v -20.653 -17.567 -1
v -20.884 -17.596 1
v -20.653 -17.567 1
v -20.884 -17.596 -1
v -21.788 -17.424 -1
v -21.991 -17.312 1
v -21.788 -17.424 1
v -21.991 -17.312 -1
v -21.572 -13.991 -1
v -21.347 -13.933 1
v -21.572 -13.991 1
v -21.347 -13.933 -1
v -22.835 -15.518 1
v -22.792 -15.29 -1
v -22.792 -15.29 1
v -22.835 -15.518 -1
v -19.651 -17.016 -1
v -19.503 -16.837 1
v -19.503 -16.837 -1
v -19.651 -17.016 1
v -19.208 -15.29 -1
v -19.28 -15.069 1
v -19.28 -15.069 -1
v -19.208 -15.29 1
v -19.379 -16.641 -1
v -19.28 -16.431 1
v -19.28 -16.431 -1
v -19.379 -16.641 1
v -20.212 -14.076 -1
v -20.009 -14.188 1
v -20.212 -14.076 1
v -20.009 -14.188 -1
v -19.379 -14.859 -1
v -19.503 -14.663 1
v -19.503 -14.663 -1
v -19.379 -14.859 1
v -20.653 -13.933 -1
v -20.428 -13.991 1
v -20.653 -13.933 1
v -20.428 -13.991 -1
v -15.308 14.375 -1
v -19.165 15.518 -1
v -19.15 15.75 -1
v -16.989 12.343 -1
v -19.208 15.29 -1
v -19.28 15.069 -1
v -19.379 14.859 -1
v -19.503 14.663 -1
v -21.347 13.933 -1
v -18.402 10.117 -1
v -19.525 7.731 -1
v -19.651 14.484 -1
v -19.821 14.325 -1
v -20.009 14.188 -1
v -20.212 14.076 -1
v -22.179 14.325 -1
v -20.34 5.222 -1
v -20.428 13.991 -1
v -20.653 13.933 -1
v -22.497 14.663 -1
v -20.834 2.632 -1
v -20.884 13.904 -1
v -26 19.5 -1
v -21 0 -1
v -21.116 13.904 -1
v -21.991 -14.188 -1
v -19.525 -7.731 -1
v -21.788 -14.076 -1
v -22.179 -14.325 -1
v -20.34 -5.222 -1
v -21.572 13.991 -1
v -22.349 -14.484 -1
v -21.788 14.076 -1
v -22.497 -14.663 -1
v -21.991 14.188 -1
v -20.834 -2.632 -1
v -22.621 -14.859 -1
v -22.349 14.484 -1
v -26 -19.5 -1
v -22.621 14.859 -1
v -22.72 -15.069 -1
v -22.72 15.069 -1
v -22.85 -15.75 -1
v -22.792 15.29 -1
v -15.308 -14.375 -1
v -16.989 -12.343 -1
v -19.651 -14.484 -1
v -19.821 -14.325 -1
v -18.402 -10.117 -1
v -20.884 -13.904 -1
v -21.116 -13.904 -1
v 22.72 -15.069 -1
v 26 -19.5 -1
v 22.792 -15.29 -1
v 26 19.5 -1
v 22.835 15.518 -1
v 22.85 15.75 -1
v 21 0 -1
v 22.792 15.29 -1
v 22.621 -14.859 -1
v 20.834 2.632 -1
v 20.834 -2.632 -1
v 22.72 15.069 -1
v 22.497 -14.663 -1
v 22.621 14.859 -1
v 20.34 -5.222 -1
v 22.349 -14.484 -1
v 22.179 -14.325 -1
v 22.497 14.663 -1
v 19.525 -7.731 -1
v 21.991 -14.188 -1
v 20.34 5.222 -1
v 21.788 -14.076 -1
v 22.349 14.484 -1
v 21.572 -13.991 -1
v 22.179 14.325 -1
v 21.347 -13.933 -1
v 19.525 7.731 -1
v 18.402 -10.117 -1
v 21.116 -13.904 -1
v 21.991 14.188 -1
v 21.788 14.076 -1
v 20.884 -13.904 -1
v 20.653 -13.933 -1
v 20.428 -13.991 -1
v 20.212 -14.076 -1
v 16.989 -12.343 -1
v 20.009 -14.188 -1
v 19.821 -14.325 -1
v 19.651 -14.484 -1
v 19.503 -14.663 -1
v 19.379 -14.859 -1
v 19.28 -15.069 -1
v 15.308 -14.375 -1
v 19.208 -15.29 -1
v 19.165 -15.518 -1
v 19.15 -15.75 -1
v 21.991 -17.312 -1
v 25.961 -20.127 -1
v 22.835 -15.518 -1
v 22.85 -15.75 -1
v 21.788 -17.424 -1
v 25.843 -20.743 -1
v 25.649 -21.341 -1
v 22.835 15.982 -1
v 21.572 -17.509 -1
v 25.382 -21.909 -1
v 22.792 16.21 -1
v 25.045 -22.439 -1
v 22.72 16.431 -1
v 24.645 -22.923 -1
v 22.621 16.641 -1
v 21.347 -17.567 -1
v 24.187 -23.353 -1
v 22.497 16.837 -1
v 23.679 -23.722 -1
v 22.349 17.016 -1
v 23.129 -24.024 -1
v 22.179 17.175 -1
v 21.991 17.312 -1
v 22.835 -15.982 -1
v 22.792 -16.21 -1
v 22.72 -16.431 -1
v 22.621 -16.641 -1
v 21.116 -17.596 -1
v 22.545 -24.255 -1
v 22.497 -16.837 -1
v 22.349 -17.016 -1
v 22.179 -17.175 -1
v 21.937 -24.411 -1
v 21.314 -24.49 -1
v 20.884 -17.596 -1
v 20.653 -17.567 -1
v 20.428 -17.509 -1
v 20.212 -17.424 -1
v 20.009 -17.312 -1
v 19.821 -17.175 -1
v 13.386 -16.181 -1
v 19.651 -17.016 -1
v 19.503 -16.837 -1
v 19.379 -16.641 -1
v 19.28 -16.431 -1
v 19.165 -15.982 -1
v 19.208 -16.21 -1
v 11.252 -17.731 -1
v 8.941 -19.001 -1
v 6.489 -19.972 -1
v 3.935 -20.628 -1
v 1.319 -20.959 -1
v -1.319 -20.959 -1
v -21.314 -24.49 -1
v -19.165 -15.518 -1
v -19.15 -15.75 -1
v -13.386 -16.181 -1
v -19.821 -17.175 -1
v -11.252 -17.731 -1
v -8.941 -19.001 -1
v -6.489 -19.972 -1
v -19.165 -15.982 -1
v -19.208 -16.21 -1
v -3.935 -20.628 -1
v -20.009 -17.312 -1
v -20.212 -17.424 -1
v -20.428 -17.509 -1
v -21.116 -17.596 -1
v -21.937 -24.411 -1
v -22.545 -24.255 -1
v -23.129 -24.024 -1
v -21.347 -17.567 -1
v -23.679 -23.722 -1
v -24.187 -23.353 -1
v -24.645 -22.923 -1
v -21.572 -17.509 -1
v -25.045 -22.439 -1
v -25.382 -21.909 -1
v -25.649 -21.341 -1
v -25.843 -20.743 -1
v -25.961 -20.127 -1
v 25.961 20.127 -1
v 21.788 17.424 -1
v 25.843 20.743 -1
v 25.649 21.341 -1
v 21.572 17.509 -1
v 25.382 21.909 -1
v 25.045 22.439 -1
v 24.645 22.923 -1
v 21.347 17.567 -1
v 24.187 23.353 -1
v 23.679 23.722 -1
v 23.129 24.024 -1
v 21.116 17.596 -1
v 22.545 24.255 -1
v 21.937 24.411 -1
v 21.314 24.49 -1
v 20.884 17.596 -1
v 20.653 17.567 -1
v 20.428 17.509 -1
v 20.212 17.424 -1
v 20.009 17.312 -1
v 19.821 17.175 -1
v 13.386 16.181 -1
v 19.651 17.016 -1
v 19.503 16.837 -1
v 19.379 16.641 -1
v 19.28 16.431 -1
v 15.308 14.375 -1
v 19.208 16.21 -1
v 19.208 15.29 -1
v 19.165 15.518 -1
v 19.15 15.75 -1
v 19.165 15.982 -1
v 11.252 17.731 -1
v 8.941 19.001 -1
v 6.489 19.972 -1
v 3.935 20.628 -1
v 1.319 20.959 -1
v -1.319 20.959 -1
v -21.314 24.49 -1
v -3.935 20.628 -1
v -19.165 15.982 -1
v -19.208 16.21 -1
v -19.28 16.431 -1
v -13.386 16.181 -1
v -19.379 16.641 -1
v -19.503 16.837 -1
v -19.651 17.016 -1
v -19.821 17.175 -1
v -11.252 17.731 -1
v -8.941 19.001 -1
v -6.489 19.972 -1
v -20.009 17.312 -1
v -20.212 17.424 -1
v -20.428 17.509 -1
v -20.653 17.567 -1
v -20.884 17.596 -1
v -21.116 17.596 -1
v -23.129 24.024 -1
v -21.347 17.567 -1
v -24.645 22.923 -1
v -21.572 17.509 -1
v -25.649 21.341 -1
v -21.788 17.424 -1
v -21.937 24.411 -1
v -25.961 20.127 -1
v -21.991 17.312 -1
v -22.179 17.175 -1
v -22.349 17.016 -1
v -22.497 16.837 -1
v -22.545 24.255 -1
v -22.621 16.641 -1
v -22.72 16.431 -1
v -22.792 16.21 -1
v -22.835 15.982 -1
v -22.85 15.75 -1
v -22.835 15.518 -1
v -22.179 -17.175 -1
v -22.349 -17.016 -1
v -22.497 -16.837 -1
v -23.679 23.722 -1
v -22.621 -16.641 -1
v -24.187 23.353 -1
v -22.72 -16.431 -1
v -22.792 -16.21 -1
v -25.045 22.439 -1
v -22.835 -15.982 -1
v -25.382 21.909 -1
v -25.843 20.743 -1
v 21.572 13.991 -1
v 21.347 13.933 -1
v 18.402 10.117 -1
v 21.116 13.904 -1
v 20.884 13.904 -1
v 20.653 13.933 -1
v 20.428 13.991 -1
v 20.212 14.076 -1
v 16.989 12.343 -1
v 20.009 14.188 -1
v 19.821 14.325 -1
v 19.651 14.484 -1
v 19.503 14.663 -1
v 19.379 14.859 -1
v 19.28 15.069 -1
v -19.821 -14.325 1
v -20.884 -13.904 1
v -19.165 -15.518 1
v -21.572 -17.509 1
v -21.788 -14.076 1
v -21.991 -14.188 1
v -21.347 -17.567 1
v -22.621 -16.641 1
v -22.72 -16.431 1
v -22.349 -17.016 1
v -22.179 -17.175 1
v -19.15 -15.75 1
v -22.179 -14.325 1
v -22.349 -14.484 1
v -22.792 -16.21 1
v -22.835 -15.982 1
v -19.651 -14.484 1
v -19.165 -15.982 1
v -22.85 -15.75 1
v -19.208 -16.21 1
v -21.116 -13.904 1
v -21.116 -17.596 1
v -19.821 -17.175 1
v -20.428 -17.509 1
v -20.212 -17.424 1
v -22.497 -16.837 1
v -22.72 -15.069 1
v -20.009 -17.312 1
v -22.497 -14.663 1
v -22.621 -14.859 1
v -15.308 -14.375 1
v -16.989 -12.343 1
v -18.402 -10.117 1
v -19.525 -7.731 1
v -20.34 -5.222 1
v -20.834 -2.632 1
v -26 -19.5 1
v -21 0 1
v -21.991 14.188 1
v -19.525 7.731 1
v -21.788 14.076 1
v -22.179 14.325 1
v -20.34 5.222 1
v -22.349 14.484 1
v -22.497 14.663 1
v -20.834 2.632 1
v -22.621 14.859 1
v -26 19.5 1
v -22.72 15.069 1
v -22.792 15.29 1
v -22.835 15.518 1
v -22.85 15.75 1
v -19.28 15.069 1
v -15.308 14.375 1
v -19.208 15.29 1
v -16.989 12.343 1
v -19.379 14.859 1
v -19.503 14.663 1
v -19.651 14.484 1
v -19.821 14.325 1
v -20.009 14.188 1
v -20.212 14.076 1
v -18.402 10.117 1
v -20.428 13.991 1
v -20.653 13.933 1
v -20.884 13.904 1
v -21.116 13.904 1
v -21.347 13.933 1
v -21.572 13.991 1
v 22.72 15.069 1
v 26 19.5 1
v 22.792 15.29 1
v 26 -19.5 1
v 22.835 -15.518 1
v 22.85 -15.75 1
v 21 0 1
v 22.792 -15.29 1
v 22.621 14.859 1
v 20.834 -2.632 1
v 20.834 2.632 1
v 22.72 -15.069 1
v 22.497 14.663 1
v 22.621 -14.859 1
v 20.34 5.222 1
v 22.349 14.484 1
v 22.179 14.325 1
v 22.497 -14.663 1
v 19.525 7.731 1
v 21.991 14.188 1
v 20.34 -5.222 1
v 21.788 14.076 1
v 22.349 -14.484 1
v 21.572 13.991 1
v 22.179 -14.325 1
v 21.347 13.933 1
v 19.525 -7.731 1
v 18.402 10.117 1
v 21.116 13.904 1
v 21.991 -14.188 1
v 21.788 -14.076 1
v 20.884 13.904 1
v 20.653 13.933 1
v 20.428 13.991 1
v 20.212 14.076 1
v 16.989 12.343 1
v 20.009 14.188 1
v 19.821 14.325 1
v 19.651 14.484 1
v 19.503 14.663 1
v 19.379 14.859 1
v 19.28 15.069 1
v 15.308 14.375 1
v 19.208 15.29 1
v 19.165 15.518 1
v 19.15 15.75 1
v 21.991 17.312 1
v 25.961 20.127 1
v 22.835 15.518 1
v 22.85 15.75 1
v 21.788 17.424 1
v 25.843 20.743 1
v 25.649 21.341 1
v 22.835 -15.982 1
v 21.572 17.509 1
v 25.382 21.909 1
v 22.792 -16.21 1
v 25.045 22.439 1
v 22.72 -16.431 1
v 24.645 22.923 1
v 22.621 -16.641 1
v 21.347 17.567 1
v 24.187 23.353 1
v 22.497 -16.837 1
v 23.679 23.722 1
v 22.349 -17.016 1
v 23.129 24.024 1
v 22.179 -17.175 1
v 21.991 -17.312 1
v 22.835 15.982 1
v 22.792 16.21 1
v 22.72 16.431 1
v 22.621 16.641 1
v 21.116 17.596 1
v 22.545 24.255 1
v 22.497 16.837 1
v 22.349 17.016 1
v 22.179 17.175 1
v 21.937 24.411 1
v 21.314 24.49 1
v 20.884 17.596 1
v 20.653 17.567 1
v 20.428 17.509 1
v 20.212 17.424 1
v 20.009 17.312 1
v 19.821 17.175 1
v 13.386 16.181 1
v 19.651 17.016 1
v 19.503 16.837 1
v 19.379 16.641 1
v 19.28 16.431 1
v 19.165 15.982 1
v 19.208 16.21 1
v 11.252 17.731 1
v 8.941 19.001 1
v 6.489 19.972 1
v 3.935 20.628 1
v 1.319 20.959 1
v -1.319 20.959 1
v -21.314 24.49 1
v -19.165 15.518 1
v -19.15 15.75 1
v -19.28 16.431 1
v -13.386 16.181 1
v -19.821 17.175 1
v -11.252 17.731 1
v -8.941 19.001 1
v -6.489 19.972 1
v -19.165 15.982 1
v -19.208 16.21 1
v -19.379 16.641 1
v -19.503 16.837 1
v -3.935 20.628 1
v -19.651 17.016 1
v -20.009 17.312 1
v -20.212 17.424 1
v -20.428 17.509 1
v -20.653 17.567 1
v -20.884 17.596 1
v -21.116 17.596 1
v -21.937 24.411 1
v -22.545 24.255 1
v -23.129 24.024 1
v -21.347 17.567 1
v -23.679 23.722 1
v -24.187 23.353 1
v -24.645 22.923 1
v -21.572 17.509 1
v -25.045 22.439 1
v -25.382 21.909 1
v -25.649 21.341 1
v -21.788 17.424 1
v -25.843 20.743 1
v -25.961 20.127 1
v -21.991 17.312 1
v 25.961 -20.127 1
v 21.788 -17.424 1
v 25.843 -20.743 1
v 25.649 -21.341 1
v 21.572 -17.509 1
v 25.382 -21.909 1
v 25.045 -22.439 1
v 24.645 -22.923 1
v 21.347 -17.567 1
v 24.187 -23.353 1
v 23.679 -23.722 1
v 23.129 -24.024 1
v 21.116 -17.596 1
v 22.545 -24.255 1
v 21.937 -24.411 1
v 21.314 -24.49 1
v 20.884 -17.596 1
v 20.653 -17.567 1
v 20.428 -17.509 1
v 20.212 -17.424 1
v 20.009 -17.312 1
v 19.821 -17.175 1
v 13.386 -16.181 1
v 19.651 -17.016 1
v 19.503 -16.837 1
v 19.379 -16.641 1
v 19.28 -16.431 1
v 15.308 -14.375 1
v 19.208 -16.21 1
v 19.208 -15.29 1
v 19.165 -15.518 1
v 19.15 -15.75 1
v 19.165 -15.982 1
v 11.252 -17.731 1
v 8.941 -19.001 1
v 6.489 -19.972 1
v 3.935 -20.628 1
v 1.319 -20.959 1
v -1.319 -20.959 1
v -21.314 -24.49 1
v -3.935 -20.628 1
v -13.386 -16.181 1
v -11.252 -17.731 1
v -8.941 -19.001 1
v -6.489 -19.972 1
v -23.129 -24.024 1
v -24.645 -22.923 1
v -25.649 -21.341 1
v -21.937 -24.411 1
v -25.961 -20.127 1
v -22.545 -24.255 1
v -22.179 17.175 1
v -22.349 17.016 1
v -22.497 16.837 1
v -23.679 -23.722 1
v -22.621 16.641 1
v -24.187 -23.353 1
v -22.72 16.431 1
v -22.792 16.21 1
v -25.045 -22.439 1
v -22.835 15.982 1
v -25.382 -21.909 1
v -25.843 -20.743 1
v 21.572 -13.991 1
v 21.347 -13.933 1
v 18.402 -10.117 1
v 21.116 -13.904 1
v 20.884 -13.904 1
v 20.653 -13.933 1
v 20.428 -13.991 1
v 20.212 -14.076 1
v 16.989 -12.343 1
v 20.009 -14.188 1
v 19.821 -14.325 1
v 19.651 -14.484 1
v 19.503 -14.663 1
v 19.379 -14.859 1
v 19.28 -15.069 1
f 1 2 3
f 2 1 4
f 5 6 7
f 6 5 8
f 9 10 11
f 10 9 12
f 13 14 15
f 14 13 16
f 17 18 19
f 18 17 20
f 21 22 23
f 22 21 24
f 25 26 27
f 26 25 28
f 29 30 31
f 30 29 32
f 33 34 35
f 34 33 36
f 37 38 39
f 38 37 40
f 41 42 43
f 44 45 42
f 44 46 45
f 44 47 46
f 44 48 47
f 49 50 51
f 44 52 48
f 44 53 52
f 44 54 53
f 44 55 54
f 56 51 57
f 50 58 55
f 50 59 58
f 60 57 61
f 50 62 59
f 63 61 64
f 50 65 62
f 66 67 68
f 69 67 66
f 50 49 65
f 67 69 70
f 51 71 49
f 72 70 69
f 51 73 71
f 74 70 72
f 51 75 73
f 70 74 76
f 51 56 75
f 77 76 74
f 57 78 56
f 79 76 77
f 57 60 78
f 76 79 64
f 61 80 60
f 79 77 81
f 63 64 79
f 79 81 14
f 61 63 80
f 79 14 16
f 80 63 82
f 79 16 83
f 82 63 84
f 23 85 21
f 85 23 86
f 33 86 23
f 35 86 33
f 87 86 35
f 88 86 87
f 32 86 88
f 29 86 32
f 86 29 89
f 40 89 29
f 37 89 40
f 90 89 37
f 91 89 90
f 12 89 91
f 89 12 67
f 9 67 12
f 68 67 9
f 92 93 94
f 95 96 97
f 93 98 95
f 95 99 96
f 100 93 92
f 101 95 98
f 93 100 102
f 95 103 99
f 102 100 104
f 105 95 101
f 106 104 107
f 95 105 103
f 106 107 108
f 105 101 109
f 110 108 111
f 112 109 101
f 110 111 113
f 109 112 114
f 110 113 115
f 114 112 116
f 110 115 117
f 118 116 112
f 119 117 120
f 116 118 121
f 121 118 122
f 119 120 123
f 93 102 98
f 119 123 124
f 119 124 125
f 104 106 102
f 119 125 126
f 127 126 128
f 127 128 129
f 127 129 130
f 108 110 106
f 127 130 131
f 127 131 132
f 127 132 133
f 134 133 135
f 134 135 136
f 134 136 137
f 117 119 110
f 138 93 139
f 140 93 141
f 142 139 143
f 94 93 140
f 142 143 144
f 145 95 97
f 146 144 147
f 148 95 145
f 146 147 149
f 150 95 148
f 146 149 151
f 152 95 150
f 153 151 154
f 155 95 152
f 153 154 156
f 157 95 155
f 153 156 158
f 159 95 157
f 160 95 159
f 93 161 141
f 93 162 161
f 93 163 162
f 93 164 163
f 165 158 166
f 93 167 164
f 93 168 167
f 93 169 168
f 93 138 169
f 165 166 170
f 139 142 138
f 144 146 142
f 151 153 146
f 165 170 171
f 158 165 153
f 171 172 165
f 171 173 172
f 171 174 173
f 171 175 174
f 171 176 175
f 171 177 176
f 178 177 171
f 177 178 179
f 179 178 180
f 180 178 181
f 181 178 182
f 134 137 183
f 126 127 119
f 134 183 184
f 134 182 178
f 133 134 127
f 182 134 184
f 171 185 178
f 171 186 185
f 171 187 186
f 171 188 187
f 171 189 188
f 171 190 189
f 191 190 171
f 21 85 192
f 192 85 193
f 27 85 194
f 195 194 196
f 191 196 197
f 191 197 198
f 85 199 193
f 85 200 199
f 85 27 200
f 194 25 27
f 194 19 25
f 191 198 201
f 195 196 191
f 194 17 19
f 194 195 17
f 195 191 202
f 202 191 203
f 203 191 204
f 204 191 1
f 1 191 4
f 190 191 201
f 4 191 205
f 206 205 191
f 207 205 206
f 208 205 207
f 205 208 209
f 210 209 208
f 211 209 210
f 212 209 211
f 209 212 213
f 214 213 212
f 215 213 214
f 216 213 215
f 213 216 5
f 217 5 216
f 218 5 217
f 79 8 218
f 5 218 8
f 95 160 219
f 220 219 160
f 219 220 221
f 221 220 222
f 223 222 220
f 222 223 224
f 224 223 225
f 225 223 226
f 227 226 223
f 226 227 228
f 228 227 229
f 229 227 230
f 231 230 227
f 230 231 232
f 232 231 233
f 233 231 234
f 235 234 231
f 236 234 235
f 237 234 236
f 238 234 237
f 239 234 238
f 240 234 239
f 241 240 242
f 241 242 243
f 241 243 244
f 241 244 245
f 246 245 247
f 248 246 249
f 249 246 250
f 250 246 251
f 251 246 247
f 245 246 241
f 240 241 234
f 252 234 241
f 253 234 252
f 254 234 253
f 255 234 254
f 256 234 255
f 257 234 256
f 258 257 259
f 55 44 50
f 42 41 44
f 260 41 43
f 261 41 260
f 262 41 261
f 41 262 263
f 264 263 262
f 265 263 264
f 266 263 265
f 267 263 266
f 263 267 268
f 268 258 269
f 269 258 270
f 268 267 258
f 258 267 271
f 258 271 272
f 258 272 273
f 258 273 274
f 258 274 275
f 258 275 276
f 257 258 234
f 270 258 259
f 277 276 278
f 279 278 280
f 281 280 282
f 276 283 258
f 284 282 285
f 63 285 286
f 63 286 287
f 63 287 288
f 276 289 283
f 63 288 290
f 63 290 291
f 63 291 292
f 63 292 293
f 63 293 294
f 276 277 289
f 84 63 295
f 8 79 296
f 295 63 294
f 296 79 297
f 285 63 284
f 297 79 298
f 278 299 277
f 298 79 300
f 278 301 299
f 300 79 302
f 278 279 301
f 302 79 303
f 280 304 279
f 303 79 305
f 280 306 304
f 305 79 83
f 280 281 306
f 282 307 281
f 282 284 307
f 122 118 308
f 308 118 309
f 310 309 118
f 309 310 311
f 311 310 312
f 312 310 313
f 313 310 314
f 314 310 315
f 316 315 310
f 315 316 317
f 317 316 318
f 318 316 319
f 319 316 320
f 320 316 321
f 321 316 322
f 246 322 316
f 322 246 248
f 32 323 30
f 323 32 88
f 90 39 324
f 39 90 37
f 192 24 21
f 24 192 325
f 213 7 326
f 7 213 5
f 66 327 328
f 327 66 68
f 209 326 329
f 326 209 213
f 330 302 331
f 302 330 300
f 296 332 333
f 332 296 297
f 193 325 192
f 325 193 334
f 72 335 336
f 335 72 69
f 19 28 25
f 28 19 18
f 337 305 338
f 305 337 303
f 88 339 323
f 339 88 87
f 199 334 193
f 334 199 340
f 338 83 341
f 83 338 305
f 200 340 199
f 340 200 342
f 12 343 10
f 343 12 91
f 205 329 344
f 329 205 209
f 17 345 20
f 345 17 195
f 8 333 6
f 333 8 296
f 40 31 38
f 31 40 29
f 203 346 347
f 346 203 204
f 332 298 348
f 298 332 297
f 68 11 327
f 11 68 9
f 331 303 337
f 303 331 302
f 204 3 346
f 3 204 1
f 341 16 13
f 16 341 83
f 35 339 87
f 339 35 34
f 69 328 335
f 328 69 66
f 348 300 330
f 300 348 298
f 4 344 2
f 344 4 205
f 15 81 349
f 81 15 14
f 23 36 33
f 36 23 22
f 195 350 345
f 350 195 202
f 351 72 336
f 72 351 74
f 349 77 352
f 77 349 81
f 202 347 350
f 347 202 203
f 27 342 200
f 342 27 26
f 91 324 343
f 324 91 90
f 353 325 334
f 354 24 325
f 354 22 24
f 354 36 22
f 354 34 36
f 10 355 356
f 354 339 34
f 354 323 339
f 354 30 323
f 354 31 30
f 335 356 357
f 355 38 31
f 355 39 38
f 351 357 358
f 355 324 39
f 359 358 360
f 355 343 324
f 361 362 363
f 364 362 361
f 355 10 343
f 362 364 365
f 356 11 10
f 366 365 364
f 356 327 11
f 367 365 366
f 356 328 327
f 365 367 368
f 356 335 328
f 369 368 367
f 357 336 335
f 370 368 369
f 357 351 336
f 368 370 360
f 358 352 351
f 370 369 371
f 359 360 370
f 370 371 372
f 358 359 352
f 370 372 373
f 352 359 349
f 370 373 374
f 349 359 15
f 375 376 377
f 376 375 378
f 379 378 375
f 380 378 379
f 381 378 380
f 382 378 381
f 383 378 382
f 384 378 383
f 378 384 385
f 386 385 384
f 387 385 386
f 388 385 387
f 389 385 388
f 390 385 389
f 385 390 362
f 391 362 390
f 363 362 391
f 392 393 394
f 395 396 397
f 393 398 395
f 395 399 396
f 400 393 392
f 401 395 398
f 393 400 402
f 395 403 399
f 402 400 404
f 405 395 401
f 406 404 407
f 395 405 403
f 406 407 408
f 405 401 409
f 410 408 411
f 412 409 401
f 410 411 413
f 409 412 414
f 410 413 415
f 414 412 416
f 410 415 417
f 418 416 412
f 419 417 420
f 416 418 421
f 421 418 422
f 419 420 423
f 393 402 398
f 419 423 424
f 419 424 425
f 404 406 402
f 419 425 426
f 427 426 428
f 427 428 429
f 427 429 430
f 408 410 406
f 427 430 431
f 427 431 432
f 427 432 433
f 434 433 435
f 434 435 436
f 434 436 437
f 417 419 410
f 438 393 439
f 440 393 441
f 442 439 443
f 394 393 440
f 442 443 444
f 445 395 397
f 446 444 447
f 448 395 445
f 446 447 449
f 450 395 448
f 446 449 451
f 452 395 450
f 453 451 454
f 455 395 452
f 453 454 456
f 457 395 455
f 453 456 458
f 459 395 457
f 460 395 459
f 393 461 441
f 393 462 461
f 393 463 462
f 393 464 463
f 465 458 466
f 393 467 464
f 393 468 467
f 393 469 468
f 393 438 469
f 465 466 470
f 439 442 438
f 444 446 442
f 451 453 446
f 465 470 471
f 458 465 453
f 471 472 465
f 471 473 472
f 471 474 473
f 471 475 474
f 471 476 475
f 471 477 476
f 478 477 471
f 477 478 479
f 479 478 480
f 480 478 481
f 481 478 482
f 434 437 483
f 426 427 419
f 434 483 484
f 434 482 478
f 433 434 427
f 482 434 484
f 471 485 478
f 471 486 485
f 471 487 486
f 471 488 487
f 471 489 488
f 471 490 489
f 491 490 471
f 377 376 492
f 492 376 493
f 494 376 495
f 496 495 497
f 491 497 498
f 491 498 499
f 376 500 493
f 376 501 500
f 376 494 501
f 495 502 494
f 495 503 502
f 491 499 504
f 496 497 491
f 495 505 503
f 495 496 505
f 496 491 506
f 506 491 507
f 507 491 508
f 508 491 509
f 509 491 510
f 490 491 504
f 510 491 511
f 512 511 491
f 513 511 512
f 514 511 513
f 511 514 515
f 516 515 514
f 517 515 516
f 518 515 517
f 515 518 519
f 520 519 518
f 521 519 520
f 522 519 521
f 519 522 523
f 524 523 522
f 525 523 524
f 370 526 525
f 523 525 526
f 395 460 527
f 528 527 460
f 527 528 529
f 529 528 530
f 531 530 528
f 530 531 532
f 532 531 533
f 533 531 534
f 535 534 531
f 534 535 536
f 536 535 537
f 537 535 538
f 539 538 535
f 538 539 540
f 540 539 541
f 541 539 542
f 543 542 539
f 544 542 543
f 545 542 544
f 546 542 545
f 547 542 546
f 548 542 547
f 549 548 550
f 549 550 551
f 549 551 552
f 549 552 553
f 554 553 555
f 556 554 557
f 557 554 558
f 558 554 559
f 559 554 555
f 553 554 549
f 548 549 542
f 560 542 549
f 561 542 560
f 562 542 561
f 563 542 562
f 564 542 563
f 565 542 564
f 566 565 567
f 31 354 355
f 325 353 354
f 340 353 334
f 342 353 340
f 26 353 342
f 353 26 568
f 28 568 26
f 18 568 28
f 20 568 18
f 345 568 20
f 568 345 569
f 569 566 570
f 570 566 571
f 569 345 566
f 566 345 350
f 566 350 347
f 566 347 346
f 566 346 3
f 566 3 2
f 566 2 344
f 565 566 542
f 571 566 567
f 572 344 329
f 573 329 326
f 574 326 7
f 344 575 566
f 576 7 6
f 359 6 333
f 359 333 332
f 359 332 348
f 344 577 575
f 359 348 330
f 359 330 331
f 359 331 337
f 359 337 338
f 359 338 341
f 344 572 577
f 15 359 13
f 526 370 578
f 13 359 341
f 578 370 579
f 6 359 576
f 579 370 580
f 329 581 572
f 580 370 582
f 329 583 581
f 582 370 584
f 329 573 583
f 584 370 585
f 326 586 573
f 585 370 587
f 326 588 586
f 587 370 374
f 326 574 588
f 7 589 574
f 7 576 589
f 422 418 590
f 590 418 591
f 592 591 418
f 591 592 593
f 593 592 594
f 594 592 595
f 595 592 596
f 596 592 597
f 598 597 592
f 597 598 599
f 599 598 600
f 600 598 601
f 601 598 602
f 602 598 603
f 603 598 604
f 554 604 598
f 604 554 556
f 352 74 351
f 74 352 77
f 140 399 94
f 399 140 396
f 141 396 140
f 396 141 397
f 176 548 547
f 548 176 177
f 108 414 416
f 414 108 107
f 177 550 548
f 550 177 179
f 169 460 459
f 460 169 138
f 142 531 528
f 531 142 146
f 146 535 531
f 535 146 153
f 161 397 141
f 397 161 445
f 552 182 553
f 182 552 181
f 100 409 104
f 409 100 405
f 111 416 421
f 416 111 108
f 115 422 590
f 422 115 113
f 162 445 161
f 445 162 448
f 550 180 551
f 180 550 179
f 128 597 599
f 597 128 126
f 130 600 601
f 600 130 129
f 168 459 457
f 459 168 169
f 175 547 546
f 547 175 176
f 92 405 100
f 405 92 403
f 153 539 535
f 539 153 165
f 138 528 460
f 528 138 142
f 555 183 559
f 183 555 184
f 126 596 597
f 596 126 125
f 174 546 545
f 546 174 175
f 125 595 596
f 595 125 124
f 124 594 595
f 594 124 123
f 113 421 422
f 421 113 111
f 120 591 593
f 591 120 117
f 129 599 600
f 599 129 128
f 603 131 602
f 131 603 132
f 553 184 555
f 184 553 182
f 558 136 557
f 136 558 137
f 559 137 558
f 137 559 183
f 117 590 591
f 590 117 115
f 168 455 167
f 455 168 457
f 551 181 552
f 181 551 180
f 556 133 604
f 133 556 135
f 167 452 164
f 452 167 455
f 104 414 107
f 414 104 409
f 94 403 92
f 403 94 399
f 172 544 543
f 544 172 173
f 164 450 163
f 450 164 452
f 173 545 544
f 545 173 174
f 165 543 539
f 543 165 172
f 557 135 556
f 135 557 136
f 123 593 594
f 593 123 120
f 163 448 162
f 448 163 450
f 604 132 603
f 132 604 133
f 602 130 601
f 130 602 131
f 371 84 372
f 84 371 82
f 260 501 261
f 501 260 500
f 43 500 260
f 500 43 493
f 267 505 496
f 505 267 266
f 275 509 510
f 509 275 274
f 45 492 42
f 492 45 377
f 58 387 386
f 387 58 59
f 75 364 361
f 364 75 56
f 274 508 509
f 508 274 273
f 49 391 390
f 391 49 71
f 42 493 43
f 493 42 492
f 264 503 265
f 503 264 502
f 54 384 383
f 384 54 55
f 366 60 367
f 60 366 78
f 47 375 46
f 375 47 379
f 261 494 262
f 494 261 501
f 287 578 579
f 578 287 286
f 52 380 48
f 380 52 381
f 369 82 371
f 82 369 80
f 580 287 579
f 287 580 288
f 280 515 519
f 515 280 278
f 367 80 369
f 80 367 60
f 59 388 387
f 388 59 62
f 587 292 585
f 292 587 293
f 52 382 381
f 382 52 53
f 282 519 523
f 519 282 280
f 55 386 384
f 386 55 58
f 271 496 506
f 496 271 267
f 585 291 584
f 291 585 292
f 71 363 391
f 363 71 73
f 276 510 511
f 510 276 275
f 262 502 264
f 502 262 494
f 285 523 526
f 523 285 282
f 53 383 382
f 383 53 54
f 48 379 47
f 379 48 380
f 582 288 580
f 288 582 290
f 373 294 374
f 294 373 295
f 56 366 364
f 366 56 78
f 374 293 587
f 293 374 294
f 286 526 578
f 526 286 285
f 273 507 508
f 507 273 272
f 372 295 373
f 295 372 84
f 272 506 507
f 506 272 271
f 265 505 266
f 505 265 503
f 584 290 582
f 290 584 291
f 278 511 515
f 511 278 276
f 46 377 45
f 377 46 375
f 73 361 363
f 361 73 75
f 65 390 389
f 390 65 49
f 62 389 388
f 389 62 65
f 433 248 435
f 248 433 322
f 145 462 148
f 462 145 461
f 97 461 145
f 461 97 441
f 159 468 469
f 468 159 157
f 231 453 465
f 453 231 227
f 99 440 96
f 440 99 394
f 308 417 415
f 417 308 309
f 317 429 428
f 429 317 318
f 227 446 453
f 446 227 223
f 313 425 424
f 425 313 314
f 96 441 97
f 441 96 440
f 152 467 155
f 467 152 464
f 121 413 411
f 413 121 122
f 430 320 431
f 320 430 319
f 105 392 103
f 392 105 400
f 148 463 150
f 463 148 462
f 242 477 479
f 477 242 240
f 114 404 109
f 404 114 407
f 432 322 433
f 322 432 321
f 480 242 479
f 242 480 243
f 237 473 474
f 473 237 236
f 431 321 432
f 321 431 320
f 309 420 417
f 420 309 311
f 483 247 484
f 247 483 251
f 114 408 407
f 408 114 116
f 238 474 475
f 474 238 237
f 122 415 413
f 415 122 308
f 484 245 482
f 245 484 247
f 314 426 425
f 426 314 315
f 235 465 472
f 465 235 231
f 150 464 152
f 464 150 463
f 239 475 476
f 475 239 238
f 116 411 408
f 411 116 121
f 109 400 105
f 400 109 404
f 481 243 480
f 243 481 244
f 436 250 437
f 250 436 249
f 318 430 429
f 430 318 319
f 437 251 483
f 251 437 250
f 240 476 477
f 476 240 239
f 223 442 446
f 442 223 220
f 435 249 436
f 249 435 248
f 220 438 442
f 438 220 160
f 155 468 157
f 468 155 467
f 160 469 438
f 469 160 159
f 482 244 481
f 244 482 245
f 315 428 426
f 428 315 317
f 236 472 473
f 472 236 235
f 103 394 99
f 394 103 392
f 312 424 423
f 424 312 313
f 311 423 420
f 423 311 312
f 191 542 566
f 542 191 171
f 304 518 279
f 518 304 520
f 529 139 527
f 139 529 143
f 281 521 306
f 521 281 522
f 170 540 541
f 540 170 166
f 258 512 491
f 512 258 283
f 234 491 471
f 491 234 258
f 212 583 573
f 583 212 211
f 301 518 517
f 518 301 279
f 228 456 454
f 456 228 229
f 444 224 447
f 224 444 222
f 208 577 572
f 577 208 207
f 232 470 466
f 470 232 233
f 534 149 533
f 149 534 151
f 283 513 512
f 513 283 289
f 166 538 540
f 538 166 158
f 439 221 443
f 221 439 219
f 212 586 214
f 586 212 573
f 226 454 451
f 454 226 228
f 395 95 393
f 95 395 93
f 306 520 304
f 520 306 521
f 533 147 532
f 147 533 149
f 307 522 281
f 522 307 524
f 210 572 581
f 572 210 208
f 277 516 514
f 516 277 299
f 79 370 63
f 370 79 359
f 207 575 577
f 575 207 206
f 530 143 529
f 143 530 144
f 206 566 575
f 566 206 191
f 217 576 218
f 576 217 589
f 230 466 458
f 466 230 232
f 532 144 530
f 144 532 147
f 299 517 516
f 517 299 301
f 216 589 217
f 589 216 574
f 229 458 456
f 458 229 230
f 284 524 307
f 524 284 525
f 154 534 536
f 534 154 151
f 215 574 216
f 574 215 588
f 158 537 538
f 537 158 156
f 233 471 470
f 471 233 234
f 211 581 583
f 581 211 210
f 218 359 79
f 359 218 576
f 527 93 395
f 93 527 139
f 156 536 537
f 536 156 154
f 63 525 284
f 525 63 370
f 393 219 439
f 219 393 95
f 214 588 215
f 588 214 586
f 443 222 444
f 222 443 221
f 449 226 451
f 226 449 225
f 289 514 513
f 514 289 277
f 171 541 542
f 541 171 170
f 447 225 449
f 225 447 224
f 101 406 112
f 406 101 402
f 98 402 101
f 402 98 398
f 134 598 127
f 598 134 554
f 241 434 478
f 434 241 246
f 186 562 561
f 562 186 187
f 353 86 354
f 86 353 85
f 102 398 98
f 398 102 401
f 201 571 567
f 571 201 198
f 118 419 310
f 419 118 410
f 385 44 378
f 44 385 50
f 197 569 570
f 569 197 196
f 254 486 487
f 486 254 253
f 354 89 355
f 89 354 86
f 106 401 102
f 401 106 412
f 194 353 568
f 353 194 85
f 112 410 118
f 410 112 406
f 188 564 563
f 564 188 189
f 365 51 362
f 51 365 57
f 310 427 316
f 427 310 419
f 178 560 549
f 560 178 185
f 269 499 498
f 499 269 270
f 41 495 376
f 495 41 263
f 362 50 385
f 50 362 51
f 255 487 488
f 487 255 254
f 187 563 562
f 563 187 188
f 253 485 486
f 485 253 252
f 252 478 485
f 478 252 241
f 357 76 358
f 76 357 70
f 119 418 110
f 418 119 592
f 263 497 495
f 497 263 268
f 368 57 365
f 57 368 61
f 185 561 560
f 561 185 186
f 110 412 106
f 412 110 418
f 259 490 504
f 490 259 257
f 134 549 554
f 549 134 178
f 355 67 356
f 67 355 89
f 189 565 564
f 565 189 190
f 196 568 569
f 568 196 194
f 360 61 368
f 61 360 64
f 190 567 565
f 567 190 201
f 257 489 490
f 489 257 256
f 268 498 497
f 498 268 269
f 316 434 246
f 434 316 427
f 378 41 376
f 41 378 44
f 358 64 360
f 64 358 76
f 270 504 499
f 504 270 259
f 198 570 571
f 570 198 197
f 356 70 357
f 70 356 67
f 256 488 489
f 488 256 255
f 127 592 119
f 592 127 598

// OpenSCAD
wall = 2;
$fn = 50;

fan_air_hole_d = 42;
fan_x_hole_dst = 42;
fan_y_hole_dst = 31.5;
fan_hole_d = 3.7;

rad_sz_x = 17;
rad_sz_y = 43;
rad_sz_z = 43;
rad_gap = 1;
rad_hole_d = 4;

module fan_plate() {
  difference() {
    minkowski()
    {
      cube([fan_x_hole_dst, rad_sz_y-4, wall/2], center=true);
      cylinder(r=5, h=wall/2, center=true);
    }
    cylinder(d=fan_air_hole_d, h=wall, center=true);
    for(ypos=[-fan_y_hole_dst/2, fan_y_hole_dst/2]) {
      for(xpos=[-fan_x_hole_dst/2, fan_x_hole_dst/2]) {
        translate([xpos, ypos, 0]) {
          cylinder(d=fan_hole_d, h=wall, center=true);
        }
      }
    }
  }
}

module fan2rad() {
  fan_plate();
  translate([wall, 0, (-rad_sz_z+2*rad_gap)/2-wall]) {
    difference() {
      cube([rad_sz_x+2*rad_gap+2*wall, rad_sz_y+2*rad_gap+2*wall, rad_sz_z+2*rad_gap+wall], center=true);
      cube([rad_sz_x+2*rad_gap, rad_sz_y+2*rad_gap, rad_sz_z+2*rad_gap+wall], center=true);
      cube([rad_sz_x+2*rad_gap+wall*2, rad_sz_y-14, rad_sz_z+2*rad_gap+wall], center=true);
      translate([wall, 0, 0]) {
        cube([rad_sz_x+2*rad_gap+wall*2, rad_sz_y-6, rad_sz_z+2*rad_gap+wall], center=true);
      }
      for(zpos=[-14, 14]) {
        for(ypos=[-18, 18]) {
          translate([-10, ypos, zpos]) {
            rotate([0, 90, 0]) {
              cylinder(d=rad_hole_d, h=10, center=true);
            }
          }
        }
      }
    }
  }
  
}

module base2fan() {
  fan_plate();
}


//fan2rad();

base2fan();
